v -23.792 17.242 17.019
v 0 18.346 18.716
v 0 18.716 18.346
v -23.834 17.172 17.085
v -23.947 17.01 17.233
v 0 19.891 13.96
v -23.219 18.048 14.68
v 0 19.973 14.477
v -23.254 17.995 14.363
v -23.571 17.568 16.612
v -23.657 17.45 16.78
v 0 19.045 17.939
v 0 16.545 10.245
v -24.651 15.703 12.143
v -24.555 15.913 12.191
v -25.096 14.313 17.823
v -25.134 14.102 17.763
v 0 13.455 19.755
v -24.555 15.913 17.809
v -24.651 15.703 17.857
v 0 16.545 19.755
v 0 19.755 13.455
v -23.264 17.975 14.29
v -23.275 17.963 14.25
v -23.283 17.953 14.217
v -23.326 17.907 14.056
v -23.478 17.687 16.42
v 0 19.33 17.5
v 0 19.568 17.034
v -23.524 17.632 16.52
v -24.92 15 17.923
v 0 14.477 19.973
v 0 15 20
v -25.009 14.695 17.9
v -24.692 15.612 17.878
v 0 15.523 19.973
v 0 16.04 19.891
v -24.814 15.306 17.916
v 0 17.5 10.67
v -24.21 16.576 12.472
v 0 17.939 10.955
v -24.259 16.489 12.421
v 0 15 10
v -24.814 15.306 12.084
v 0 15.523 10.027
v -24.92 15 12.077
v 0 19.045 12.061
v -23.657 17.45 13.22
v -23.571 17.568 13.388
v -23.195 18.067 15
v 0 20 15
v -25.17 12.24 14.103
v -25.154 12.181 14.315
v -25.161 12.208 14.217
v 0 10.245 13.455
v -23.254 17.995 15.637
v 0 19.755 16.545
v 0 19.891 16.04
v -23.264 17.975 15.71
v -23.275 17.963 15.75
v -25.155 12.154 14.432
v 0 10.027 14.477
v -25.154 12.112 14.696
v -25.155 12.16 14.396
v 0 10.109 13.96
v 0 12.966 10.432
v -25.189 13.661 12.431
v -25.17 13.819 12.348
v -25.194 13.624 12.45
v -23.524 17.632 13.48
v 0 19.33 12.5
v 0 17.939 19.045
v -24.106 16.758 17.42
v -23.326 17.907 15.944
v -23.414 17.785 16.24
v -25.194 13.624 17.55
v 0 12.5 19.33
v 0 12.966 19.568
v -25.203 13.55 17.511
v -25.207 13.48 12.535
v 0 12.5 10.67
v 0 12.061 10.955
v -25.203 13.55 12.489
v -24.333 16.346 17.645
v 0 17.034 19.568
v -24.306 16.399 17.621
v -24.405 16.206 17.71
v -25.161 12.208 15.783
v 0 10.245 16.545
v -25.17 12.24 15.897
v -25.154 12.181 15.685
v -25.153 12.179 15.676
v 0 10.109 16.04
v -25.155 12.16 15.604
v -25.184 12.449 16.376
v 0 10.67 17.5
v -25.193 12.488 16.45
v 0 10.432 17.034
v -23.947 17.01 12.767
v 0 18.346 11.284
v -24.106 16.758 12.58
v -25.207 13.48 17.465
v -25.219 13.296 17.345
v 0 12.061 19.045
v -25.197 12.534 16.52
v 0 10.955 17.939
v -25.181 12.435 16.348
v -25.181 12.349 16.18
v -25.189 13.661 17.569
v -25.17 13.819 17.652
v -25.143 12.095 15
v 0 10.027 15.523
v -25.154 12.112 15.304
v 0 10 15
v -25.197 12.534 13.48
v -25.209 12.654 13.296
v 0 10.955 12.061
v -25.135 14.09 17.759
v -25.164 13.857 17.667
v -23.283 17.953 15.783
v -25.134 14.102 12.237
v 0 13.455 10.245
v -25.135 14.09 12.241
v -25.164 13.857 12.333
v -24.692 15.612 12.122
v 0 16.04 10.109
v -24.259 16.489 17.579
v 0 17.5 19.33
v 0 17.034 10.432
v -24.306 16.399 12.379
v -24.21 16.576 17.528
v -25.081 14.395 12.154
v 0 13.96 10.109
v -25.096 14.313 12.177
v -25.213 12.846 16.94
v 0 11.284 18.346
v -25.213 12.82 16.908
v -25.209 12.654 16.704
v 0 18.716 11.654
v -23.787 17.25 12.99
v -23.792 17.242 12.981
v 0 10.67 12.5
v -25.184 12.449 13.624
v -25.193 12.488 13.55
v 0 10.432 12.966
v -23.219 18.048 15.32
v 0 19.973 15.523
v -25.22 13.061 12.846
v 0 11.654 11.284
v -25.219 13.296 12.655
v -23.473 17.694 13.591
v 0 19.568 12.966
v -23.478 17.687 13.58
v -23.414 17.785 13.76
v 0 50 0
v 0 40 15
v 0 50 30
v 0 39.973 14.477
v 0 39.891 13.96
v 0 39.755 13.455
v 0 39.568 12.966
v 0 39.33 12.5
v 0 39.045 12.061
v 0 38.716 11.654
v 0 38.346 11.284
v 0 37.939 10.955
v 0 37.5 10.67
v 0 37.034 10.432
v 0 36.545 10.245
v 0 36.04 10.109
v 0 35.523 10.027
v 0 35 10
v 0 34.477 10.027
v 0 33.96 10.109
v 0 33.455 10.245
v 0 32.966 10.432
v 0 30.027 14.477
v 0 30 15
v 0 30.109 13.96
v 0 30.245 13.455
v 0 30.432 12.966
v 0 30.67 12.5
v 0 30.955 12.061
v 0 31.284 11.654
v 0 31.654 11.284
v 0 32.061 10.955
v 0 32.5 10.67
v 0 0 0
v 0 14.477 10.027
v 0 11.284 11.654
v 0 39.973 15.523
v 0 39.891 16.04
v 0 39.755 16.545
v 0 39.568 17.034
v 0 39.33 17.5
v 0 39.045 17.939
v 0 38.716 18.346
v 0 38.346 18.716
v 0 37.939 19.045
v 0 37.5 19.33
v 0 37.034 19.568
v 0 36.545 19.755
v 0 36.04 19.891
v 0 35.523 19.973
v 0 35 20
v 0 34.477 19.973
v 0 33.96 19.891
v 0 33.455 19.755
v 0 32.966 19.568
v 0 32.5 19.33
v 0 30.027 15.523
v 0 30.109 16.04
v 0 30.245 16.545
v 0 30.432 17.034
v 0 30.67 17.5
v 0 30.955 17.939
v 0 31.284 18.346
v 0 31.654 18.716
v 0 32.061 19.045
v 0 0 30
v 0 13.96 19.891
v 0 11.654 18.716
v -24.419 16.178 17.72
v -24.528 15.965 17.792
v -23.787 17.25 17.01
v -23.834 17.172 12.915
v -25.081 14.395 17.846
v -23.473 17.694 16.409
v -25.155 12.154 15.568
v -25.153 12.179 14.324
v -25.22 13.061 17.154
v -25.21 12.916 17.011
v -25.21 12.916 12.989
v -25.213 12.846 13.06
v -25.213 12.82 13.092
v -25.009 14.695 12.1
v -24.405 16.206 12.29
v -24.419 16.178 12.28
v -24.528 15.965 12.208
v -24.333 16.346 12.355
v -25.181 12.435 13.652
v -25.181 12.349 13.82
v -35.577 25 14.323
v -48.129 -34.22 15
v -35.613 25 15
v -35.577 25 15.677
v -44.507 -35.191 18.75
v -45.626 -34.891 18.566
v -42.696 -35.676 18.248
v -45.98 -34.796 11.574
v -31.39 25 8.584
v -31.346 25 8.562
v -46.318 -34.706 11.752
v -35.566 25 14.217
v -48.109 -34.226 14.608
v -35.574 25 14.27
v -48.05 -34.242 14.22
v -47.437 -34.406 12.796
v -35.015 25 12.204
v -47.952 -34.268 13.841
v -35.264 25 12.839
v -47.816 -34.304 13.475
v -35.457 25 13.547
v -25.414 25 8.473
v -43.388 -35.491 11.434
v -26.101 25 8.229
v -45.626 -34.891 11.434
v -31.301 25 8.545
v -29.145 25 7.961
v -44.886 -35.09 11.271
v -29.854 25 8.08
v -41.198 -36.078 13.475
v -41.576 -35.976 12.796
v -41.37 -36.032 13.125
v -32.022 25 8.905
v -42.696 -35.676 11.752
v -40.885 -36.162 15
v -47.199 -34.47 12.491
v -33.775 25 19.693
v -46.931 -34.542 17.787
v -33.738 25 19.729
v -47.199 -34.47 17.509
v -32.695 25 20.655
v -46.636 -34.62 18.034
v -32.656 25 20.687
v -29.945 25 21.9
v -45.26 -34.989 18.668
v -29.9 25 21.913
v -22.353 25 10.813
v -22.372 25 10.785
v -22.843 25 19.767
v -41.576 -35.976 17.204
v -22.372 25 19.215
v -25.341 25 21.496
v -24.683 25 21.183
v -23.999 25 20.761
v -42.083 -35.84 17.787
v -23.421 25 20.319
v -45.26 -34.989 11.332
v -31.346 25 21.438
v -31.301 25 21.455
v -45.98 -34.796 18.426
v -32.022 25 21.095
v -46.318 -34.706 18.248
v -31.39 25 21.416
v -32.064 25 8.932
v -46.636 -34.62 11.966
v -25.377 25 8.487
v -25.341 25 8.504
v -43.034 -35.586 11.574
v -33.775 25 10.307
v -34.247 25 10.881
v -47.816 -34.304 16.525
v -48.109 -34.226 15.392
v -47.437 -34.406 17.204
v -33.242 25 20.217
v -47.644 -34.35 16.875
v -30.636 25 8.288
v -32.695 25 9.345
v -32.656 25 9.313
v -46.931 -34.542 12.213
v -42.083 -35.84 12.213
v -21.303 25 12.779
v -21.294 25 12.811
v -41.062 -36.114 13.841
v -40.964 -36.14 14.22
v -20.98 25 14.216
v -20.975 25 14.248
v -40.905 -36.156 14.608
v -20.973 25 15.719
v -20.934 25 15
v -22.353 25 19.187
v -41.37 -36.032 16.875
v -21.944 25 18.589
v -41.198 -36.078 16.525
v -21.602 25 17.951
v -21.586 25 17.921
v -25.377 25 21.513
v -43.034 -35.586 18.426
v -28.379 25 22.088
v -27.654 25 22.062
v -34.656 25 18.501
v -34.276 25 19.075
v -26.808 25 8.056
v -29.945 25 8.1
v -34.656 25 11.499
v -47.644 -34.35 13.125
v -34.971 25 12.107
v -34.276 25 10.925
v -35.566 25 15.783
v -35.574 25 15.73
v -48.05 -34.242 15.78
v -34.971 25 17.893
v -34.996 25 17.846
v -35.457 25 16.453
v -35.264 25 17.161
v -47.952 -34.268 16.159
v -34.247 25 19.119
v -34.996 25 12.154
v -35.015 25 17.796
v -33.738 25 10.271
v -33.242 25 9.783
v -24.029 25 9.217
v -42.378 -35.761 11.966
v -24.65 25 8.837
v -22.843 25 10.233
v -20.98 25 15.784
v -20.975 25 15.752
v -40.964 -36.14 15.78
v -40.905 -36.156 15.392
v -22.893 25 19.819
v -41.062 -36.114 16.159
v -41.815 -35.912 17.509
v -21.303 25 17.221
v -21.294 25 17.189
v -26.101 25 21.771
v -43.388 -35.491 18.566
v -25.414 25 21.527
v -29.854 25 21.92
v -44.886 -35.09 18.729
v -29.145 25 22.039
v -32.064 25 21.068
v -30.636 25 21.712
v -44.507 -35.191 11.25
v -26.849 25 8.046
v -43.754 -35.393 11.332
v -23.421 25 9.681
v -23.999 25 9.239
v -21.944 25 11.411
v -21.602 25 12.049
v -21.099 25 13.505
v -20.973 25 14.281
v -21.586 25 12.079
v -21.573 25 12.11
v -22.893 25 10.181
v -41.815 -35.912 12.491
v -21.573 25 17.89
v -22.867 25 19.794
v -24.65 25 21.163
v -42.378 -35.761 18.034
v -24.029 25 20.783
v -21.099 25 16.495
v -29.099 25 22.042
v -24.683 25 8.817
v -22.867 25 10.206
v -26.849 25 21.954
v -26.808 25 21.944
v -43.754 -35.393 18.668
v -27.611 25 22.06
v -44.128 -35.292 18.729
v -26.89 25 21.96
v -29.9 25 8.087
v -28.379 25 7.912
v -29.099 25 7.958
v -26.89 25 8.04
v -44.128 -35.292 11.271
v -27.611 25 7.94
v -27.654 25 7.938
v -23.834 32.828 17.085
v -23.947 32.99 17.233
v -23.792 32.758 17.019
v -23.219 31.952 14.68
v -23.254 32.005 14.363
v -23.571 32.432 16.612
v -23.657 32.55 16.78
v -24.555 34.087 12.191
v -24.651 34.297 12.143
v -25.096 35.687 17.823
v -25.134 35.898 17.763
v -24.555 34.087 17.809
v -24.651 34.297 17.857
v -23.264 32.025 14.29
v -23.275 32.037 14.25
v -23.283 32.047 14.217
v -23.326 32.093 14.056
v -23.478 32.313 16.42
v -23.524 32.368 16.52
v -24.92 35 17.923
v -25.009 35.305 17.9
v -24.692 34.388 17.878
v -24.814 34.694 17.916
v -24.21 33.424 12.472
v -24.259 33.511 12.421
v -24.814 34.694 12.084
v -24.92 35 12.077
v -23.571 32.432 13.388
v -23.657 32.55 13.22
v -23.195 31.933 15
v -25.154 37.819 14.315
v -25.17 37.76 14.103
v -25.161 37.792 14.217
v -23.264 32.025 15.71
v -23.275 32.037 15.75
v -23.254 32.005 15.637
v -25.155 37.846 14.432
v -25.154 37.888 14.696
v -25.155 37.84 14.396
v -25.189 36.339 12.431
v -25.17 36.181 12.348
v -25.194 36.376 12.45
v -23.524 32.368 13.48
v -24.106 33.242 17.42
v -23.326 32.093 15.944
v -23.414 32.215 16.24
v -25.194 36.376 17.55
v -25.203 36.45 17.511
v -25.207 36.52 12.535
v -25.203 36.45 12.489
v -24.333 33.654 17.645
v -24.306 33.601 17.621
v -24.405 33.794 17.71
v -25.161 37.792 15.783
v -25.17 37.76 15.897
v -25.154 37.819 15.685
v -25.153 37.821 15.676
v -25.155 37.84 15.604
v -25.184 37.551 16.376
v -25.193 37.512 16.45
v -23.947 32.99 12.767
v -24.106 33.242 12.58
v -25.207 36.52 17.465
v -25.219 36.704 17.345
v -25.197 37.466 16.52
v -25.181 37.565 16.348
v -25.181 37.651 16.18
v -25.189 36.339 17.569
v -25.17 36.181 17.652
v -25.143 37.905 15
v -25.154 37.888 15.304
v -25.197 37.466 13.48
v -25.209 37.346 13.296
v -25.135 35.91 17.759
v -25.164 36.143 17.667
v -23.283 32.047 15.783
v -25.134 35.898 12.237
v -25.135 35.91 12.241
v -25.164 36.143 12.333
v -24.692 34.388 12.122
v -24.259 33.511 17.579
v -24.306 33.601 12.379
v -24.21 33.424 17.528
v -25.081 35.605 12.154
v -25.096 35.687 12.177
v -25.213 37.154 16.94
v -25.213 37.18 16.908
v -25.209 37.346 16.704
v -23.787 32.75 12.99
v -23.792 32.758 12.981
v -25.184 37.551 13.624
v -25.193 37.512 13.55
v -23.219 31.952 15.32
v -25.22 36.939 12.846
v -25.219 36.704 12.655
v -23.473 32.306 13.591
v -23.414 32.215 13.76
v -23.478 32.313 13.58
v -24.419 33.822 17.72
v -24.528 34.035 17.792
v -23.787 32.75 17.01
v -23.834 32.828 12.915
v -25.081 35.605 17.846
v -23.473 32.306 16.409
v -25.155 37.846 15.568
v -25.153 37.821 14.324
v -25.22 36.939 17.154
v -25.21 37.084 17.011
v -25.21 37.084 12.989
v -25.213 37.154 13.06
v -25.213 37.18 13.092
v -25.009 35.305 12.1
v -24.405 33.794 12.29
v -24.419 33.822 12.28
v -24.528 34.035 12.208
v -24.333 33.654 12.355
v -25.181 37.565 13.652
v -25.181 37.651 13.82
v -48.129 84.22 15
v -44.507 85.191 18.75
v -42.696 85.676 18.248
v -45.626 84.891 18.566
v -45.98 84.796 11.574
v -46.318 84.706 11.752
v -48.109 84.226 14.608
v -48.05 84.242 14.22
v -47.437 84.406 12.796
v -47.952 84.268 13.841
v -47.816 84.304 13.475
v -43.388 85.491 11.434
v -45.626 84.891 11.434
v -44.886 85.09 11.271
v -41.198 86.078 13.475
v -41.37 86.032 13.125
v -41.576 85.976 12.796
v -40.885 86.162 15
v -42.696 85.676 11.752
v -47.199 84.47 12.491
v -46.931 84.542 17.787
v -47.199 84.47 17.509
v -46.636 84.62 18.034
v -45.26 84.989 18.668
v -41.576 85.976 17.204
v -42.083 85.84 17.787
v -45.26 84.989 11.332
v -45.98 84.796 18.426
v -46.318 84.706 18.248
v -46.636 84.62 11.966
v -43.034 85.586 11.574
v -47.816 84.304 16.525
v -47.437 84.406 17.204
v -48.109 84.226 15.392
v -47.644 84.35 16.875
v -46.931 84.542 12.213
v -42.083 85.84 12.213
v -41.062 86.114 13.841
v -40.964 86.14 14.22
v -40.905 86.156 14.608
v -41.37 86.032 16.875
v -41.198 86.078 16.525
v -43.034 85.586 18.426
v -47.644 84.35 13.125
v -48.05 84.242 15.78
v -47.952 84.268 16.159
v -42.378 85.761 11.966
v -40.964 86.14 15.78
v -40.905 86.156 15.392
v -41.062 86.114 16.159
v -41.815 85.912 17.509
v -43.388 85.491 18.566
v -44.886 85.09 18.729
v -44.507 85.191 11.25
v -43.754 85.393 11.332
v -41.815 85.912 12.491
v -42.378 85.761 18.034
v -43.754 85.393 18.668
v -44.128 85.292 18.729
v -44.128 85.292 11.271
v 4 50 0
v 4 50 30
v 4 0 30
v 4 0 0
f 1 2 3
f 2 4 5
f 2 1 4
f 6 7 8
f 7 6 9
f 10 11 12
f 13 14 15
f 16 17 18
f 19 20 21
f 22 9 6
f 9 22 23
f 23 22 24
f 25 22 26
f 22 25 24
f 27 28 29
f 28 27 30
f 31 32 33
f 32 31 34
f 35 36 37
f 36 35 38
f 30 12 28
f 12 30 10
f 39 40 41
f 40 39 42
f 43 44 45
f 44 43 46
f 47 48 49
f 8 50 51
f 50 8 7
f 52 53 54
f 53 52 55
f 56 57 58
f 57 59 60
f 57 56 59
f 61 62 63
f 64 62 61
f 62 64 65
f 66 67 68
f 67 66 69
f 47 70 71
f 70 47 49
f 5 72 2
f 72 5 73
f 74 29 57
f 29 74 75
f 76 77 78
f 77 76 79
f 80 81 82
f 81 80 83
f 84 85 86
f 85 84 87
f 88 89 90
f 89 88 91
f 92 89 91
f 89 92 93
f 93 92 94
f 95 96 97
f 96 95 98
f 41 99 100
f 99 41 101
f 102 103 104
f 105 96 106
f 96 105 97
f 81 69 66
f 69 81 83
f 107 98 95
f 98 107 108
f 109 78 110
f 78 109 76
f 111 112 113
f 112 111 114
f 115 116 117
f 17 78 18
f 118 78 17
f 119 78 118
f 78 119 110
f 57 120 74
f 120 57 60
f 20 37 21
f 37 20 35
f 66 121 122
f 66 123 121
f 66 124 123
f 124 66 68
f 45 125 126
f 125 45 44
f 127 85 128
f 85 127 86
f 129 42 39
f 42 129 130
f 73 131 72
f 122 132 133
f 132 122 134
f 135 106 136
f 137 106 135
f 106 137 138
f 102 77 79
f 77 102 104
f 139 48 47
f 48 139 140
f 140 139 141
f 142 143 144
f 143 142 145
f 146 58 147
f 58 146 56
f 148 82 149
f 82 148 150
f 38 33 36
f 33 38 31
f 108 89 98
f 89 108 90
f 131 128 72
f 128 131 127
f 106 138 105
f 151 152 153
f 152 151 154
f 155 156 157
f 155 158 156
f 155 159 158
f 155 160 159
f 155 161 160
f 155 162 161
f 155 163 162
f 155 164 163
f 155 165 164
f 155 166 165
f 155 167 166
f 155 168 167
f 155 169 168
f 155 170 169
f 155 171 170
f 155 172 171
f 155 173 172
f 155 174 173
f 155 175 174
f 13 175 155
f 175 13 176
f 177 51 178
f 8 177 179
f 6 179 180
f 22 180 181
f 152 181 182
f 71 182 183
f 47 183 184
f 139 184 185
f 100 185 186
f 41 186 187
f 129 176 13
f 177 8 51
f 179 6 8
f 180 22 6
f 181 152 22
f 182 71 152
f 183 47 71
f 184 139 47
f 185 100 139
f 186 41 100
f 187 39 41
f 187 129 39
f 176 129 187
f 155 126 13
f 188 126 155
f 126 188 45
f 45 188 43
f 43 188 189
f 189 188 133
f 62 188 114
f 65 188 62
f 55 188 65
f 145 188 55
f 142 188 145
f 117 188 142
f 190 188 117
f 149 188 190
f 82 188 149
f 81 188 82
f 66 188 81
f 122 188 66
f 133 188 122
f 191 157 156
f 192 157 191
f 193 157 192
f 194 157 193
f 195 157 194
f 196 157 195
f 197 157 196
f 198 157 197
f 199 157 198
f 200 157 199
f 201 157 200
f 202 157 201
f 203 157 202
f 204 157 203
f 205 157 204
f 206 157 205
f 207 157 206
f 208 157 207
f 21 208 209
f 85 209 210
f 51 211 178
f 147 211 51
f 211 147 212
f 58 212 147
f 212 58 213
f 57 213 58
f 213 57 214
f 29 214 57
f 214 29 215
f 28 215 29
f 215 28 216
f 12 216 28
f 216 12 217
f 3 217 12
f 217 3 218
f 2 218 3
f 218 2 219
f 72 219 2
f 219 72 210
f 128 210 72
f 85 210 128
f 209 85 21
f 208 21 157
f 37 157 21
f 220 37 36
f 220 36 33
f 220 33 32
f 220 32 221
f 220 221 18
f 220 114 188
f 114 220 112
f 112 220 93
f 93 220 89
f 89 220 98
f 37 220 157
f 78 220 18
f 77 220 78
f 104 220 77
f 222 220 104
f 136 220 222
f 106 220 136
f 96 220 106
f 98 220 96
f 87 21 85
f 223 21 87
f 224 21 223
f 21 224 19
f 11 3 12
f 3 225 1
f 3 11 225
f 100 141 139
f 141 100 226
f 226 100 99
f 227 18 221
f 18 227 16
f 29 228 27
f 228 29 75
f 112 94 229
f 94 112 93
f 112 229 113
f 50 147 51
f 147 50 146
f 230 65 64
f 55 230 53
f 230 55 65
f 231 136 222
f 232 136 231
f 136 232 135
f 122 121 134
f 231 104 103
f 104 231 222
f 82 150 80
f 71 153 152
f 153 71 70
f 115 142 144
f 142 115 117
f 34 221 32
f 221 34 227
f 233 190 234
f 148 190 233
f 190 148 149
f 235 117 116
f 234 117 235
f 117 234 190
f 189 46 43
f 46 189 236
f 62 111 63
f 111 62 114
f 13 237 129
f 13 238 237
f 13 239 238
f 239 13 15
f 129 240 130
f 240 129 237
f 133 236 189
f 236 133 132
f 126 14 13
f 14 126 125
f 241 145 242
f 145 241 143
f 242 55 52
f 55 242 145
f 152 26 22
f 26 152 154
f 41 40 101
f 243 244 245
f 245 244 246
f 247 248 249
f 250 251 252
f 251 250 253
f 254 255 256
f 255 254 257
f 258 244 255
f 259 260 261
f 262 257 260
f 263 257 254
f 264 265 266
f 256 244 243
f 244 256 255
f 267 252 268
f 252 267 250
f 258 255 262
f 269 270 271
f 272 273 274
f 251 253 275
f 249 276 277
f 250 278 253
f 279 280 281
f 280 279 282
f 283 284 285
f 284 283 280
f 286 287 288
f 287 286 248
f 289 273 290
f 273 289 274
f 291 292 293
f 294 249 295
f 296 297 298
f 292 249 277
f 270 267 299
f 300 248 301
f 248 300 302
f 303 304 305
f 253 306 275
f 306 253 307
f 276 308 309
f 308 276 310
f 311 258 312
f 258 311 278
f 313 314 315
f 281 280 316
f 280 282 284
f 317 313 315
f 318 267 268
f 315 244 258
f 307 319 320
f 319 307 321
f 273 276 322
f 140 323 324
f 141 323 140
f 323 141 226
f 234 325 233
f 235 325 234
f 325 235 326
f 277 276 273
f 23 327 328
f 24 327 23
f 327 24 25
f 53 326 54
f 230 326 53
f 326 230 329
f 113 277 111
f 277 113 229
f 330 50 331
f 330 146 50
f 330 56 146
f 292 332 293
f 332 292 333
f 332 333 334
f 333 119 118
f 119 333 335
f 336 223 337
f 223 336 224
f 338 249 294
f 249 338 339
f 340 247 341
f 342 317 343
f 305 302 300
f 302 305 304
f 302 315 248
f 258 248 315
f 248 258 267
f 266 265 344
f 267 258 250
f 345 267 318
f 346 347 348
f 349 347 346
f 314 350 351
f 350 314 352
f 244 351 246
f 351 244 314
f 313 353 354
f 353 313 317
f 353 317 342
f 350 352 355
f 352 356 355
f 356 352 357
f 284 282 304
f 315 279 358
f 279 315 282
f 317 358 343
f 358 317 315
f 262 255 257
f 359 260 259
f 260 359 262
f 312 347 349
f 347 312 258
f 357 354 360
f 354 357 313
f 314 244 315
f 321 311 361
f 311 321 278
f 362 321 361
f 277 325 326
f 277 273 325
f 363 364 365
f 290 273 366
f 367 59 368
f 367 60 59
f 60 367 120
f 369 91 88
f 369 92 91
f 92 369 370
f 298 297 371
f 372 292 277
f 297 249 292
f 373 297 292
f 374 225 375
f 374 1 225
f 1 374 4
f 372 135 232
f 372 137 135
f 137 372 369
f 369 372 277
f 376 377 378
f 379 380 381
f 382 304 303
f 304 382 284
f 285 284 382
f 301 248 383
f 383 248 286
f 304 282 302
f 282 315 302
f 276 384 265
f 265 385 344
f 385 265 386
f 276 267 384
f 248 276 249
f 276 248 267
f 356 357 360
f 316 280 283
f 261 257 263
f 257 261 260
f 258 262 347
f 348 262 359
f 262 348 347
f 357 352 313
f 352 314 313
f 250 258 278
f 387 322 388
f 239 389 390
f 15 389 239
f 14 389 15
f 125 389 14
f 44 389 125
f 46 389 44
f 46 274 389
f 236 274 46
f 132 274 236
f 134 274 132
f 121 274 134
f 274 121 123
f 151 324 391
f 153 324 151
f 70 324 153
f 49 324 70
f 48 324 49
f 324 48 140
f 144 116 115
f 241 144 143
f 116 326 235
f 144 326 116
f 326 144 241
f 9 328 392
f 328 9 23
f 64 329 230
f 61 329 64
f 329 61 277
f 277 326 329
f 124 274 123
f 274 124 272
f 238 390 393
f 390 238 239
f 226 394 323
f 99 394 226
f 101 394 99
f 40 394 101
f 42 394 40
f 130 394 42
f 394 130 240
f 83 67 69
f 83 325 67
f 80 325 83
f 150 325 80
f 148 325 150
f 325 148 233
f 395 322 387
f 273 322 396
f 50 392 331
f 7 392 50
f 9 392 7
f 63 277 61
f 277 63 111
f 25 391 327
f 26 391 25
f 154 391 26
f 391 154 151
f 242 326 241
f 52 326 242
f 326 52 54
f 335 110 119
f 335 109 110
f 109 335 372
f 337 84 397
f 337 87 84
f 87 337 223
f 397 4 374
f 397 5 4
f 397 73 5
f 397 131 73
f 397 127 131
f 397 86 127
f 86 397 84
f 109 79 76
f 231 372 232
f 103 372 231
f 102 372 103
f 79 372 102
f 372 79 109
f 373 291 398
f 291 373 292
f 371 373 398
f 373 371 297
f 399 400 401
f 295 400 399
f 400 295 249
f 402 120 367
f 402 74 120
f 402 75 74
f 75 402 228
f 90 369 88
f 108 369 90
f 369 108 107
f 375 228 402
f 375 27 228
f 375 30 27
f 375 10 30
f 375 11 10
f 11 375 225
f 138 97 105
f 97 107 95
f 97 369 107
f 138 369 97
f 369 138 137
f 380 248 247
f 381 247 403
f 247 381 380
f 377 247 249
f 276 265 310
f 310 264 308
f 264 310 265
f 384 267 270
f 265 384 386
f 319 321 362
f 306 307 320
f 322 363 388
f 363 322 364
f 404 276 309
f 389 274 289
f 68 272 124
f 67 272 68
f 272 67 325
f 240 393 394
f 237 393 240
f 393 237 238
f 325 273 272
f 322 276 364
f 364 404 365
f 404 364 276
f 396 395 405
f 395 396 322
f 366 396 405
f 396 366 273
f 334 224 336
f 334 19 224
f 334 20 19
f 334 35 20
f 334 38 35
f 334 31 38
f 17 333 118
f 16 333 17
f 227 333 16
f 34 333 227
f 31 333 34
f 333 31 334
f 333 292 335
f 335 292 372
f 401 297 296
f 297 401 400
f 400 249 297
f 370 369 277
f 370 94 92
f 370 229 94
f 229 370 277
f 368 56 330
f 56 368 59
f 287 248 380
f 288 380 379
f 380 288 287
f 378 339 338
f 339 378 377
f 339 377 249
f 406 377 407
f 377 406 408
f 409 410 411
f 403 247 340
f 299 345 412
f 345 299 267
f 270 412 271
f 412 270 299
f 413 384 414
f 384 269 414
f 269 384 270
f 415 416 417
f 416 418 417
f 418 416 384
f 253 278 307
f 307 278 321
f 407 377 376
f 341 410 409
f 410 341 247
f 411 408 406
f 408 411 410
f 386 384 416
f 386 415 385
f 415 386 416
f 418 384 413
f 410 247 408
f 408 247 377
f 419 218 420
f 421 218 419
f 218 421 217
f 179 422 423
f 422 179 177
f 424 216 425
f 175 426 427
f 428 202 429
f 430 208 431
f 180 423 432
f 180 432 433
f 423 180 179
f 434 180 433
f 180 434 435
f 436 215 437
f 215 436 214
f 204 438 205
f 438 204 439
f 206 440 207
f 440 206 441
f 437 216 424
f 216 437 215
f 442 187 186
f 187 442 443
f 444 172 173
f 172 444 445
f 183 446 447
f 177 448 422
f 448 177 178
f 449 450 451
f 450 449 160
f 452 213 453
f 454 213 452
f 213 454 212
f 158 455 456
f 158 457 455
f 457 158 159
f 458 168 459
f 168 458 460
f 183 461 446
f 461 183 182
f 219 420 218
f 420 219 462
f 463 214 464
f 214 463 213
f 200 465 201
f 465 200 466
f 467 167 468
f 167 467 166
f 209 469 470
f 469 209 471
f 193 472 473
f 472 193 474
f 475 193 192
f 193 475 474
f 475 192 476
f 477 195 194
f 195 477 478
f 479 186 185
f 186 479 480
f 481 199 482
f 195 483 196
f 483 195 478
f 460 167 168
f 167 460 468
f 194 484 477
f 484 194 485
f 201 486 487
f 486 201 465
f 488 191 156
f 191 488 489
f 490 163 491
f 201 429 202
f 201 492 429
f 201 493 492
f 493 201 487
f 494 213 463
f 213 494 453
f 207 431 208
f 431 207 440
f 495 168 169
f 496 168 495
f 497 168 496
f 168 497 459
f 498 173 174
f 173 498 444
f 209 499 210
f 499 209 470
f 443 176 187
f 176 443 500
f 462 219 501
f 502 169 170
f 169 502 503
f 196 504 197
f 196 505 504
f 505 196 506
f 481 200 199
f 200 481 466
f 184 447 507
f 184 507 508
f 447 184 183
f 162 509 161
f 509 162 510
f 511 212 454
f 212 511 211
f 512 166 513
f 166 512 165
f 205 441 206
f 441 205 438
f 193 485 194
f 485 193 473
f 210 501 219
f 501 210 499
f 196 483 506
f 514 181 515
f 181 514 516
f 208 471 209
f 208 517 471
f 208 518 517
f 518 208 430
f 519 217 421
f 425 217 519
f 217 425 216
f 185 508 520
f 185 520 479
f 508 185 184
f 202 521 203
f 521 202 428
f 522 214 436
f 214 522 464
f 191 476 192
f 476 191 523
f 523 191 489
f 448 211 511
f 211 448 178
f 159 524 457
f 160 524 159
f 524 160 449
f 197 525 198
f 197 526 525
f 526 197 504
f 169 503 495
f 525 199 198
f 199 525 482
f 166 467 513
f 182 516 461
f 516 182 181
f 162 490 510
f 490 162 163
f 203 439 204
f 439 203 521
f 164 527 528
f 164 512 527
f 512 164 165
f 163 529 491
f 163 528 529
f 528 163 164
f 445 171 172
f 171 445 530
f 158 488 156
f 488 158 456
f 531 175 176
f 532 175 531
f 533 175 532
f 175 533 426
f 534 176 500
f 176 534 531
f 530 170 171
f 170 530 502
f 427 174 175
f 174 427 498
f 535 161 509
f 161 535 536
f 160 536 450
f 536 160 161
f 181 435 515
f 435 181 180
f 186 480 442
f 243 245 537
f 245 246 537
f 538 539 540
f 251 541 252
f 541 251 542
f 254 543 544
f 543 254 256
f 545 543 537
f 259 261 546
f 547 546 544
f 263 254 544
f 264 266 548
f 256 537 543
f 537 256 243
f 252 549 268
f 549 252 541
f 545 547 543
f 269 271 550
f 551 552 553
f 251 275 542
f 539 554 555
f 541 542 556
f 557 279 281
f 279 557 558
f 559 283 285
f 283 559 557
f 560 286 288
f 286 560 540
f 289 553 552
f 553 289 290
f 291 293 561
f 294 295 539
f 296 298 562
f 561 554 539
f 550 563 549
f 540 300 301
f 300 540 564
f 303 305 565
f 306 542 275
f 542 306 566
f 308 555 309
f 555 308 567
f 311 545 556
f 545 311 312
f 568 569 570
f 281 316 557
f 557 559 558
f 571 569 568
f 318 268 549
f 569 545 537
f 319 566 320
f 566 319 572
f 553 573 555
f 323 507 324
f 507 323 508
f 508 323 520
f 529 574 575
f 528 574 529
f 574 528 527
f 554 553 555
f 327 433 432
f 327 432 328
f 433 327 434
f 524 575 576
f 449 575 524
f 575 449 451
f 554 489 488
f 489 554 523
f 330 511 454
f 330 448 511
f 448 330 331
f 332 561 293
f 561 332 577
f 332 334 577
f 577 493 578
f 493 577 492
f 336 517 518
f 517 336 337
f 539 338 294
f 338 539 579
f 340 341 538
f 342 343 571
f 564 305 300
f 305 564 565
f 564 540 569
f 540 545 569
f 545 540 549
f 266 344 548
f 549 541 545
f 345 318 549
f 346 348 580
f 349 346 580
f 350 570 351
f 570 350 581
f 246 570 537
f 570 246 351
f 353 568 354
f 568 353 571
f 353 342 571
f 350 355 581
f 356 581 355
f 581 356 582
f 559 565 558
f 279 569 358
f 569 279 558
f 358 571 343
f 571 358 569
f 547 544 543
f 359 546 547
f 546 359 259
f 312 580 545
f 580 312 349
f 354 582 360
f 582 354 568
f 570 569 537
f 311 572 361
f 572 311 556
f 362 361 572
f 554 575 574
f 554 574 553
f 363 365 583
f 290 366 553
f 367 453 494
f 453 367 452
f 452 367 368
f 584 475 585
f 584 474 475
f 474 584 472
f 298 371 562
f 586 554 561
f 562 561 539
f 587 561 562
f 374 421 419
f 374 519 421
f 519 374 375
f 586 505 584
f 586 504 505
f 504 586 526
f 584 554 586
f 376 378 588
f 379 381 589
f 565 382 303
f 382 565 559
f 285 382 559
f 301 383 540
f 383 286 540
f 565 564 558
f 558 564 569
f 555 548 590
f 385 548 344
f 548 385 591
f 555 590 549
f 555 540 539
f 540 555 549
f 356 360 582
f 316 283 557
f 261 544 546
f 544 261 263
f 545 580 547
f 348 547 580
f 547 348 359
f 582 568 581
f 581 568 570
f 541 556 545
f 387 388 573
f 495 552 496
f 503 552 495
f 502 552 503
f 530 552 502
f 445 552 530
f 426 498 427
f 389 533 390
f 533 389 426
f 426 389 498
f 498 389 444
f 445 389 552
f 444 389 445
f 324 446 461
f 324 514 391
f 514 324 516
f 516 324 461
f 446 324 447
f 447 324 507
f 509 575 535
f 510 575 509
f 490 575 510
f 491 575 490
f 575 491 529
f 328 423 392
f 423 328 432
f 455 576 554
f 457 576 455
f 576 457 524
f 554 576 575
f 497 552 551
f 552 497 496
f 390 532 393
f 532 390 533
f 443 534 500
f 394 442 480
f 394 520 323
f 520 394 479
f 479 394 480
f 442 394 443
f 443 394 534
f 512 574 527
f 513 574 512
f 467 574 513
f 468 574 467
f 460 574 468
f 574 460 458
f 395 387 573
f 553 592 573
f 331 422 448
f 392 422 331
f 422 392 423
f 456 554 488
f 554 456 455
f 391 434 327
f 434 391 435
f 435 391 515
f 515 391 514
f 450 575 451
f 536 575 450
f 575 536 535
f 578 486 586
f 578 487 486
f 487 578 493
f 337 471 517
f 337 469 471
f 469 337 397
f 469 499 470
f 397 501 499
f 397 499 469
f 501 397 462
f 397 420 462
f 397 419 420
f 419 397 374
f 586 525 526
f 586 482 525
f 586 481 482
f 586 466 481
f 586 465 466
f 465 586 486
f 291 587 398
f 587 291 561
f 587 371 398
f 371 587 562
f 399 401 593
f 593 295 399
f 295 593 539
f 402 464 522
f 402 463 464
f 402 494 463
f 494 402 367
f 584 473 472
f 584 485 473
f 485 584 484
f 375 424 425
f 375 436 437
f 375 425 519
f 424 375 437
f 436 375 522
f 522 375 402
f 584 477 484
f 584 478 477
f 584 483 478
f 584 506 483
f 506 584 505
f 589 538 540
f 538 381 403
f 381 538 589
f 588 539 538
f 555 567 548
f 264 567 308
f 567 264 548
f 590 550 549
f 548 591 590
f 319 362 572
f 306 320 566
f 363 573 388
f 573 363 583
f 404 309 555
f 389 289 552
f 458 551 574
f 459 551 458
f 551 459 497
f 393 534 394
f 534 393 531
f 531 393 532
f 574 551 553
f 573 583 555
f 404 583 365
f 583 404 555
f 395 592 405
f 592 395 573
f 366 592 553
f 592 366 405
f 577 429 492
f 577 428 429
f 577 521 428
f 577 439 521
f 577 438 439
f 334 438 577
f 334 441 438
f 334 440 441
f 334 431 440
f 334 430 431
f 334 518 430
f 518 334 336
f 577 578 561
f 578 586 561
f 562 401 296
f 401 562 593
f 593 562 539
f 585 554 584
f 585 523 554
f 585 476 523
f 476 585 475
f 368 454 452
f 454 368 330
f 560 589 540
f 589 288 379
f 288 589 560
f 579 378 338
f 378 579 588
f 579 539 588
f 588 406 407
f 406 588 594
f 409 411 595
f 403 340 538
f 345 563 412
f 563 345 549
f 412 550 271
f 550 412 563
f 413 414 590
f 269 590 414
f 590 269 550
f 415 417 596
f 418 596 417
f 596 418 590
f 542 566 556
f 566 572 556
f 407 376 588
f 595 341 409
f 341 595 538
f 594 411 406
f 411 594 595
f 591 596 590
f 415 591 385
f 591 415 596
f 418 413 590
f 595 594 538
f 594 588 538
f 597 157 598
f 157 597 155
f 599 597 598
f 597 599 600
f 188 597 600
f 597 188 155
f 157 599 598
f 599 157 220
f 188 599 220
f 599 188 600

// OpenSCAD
$fn=60;

module bracket_panel(width, length, thickness, screw_position) {


    difference() {
        linear_extrude(thickness) {
            square([width, length]);
        }

        if (screw_position != undef) {
            union() {
                translate([screw_position[0], screw_position[1],0])
                rotate([0,0,90]) {
                    linear_extrude(thickness * 5, center=true)
                    circle(3);
                }

                //mirrors the above
                translate([width - screw_position[0], length - screw_position[1],0])
                rotate([0,0,90]) {
                    linear_extrude(thickness * 5, center=true)
                    circle(3);
                }
            }
        }
    }
}

module half_handle() {
    rotate([-90,0,90])
    difference() {
        translate ([-10,0,0]) {
        
            translate([0,0,0])
            linear_extrude(30, scale=0.5) circle(5);

            rotate([0, -75, 0])
            translate([30,0,-10])
            linear_extrude(70, scale=0.5) circle(7.5);
        }

        translate([0,-15,0]) cube([30,30,60]);
    }
}

module handle() {
    half_handle();
    mirror([0,1,0]) half_handle();
}

thickness=3;
width=50;
length=50;

//bracket_panel(width, length, thickness, [2/5 * width, 1/5 * length]);

translate([4,0,0])
rotate([0,-90,0]) {
    bracket_panel(30, length, 4);
}

offset=[0,25,15];
translate(offset) handle();
